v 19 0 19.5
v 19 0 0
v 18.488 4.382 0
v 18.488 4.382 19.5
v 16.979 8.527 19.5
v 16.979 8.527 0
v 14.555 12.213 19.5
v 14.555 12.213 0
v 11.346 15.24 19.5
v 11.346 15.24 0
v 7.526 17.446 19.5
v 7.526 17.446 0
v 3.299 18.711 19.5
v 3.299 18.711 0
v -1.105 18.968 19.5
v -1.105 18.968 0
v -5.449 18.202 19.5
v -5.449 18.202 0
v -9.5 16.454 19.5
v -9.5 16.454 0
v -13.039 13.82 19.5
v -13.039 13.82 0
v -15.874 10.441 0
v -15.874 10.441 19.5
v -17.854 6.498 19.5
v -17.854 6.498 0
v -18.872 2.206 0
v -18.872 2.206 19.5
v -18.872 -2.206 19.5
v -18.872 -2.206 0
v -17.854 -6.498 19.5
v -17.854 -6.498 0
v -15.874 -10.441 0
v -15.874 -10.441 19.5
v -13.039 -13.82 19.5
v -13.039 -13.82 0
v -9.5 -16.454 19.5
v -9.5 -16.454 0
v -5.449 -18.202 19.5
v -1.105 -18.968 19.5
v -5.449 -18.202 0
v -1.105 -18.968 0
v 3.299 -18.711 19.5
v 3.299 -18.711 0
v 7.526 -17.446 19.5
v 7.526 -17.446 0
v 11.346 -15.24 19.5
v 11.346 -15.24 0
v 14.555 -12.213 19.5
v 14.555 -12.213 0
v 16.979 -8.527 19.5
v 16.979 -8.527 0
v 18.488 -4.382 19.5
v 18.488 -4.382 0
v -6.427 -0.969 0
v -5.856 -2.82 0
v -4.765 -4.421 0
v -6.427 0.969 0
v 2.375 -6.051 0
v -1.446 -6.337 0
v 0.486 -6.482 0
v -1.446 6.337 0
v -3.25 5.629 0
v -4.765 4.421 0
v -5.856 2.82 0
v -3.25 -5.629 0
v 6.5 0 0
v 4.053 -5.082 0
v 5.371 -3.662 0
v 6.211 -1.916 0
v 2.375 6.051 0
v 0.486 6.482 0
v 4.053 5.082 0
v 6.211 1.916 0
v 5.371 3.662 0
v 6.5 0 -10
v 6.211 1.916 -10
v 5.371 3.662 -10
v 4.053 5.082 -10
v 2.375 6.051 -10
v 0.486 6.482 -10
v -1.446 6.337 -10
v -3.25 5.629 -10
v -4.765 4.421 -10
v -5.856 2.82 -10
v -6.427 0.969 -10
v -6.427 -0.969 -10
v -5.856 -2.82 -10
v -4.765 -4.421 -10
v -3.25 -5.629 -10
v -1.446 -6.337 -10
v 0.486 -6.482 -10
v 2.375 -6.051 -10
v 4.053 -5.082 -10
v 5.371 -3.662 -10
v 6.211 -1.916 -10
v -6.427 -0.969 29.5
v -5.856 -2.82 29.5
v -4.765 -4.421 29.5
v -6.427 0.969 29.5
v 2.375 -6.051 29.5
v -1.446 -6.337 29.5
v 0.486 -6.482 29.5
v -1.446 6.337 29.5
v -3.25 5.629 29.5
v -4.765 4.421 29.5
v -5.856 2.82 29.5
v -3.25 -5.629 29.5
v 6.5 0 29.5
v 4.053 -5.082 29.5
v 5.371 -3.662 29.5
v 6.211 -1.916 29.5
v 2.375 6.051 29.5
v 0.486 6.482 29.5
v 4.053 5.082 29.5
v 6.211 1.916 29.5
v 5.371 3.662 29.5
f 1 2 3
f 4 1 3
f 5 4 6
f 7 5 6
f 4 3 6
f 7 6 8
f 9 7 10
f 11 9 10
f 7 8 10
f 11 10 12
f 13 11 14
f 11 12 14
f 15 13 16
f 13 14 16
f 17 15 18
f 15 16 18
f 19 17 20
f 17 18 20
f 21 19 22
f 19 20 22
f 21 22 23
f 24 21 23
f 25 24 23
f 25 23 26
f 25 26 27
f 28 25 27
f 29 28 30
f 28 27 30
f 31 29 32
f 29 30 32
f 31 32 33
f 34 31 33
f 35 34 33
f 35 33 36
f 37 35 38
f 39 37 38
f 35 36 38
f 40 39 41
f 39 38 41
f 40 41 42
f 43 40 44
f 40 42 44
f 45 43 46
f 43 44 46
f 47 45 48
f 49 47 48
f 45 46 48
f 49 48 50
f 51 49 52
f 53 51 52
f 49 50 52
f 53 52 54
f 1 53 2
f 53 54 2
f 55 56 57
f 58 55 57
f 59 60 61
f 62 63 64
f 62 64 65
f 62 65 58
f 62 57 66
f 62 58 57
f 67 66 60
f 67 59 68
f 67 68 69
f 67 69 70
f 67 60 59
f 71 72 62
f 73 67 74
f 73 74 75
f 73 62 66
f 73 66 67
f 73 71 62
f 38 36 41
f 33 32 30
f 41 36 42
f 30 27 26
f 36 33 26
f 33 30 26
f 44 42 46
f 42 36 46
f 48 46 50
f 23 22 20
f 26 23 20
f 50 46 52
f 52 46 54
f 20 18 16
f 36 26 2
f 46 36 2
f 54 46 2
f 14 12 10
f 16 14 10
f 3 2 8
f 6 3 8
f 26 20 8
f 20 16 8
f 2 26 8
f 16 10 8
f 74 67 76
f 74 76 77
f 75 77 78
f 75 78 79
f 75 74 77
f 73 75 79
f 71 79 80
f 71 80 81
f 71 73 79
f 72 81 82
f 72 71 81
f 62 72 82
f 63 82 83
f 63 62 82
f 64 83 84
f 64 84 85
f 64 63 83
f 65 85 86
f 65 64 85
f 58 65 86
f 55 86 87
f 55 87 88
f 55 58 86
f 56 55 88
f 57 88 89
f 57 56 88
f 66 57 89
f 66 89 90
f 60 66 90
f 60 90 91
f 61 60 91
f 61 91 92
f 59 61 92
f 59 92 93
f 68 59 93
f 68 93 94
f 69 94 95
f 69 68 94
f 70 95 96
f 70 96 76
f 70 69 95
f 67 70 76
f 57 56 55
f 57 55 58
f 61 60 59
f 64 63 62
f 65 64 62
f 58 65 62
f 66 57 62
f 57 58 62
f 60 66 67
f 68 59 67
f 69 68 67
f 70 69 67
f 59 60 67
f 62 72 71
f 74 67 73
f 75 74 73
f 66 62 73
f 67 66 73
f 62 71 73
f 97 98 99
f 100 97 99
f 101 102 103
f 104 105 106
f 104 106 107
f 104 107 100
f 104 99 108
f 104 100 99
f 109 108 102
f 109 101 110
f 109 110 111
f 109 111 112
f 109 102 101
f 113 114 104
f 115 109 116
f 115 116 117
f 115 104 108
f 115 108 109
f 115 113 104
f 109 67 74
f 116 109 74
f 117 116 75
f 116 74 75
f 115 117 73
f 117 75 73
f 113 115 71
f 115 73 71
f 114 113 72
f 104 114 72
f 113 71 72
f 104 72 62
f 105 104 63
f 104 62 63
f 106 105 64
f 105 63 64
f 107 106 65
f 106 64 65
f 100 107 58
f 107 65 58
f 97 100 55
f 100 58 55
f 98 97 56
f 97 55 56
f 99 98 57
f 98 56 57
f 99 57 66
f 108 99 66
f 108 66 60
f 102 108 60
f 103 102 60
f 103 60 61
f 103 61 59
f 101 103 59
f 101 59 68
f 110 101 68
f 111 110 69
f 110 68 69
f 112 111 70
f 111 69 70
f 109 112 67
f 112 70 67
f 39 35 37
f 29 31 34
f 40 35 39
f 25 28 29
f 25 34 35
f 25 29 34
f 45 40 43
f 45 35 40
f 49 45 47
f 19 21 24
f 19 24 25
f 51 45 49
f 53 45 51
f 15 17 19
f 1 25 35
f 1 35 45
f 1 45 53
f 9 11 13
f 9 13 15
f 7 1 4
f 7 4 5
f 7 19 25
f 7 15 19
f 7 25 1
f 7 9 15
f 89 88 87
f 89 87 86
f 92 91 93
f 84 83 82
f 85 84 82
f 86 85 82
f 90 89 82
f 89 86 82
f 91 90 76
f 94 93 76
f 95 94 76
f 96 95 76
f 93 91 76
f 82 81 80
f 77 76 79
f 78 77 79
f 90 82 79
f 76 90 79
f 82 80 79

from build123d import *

# Parameters (mm, degrees)
F0_R     = 19
F1_DEPTH = 19.5
F2_R     = 6.5
F3_DEPTH = 29.5
F4_DEPTH = 10


with BuildPart() as f1:
    # F0 (on Top) → F1 (new body)
    with BuildSketch(Plane.XY):
        Circle(F0_R)
    extrude(amount=F1_DEPTH)


with BuildPart() as f3:
    # F2 (on Top) → F3 (new body)
    with BuildSketch(Plane.XY):
        Circle(F2_R)
    extrude(amount=F3_DEPTH)


with BuildPart() as f4:
    # F2 (on Top) → F4 (new body)
    with BuildSketch(Plane.XY):
        Circle(F2_R)
    extrude(amount=-F4_DEPTH)


solid = Compound([f1.part, f3.part, f4.part])
